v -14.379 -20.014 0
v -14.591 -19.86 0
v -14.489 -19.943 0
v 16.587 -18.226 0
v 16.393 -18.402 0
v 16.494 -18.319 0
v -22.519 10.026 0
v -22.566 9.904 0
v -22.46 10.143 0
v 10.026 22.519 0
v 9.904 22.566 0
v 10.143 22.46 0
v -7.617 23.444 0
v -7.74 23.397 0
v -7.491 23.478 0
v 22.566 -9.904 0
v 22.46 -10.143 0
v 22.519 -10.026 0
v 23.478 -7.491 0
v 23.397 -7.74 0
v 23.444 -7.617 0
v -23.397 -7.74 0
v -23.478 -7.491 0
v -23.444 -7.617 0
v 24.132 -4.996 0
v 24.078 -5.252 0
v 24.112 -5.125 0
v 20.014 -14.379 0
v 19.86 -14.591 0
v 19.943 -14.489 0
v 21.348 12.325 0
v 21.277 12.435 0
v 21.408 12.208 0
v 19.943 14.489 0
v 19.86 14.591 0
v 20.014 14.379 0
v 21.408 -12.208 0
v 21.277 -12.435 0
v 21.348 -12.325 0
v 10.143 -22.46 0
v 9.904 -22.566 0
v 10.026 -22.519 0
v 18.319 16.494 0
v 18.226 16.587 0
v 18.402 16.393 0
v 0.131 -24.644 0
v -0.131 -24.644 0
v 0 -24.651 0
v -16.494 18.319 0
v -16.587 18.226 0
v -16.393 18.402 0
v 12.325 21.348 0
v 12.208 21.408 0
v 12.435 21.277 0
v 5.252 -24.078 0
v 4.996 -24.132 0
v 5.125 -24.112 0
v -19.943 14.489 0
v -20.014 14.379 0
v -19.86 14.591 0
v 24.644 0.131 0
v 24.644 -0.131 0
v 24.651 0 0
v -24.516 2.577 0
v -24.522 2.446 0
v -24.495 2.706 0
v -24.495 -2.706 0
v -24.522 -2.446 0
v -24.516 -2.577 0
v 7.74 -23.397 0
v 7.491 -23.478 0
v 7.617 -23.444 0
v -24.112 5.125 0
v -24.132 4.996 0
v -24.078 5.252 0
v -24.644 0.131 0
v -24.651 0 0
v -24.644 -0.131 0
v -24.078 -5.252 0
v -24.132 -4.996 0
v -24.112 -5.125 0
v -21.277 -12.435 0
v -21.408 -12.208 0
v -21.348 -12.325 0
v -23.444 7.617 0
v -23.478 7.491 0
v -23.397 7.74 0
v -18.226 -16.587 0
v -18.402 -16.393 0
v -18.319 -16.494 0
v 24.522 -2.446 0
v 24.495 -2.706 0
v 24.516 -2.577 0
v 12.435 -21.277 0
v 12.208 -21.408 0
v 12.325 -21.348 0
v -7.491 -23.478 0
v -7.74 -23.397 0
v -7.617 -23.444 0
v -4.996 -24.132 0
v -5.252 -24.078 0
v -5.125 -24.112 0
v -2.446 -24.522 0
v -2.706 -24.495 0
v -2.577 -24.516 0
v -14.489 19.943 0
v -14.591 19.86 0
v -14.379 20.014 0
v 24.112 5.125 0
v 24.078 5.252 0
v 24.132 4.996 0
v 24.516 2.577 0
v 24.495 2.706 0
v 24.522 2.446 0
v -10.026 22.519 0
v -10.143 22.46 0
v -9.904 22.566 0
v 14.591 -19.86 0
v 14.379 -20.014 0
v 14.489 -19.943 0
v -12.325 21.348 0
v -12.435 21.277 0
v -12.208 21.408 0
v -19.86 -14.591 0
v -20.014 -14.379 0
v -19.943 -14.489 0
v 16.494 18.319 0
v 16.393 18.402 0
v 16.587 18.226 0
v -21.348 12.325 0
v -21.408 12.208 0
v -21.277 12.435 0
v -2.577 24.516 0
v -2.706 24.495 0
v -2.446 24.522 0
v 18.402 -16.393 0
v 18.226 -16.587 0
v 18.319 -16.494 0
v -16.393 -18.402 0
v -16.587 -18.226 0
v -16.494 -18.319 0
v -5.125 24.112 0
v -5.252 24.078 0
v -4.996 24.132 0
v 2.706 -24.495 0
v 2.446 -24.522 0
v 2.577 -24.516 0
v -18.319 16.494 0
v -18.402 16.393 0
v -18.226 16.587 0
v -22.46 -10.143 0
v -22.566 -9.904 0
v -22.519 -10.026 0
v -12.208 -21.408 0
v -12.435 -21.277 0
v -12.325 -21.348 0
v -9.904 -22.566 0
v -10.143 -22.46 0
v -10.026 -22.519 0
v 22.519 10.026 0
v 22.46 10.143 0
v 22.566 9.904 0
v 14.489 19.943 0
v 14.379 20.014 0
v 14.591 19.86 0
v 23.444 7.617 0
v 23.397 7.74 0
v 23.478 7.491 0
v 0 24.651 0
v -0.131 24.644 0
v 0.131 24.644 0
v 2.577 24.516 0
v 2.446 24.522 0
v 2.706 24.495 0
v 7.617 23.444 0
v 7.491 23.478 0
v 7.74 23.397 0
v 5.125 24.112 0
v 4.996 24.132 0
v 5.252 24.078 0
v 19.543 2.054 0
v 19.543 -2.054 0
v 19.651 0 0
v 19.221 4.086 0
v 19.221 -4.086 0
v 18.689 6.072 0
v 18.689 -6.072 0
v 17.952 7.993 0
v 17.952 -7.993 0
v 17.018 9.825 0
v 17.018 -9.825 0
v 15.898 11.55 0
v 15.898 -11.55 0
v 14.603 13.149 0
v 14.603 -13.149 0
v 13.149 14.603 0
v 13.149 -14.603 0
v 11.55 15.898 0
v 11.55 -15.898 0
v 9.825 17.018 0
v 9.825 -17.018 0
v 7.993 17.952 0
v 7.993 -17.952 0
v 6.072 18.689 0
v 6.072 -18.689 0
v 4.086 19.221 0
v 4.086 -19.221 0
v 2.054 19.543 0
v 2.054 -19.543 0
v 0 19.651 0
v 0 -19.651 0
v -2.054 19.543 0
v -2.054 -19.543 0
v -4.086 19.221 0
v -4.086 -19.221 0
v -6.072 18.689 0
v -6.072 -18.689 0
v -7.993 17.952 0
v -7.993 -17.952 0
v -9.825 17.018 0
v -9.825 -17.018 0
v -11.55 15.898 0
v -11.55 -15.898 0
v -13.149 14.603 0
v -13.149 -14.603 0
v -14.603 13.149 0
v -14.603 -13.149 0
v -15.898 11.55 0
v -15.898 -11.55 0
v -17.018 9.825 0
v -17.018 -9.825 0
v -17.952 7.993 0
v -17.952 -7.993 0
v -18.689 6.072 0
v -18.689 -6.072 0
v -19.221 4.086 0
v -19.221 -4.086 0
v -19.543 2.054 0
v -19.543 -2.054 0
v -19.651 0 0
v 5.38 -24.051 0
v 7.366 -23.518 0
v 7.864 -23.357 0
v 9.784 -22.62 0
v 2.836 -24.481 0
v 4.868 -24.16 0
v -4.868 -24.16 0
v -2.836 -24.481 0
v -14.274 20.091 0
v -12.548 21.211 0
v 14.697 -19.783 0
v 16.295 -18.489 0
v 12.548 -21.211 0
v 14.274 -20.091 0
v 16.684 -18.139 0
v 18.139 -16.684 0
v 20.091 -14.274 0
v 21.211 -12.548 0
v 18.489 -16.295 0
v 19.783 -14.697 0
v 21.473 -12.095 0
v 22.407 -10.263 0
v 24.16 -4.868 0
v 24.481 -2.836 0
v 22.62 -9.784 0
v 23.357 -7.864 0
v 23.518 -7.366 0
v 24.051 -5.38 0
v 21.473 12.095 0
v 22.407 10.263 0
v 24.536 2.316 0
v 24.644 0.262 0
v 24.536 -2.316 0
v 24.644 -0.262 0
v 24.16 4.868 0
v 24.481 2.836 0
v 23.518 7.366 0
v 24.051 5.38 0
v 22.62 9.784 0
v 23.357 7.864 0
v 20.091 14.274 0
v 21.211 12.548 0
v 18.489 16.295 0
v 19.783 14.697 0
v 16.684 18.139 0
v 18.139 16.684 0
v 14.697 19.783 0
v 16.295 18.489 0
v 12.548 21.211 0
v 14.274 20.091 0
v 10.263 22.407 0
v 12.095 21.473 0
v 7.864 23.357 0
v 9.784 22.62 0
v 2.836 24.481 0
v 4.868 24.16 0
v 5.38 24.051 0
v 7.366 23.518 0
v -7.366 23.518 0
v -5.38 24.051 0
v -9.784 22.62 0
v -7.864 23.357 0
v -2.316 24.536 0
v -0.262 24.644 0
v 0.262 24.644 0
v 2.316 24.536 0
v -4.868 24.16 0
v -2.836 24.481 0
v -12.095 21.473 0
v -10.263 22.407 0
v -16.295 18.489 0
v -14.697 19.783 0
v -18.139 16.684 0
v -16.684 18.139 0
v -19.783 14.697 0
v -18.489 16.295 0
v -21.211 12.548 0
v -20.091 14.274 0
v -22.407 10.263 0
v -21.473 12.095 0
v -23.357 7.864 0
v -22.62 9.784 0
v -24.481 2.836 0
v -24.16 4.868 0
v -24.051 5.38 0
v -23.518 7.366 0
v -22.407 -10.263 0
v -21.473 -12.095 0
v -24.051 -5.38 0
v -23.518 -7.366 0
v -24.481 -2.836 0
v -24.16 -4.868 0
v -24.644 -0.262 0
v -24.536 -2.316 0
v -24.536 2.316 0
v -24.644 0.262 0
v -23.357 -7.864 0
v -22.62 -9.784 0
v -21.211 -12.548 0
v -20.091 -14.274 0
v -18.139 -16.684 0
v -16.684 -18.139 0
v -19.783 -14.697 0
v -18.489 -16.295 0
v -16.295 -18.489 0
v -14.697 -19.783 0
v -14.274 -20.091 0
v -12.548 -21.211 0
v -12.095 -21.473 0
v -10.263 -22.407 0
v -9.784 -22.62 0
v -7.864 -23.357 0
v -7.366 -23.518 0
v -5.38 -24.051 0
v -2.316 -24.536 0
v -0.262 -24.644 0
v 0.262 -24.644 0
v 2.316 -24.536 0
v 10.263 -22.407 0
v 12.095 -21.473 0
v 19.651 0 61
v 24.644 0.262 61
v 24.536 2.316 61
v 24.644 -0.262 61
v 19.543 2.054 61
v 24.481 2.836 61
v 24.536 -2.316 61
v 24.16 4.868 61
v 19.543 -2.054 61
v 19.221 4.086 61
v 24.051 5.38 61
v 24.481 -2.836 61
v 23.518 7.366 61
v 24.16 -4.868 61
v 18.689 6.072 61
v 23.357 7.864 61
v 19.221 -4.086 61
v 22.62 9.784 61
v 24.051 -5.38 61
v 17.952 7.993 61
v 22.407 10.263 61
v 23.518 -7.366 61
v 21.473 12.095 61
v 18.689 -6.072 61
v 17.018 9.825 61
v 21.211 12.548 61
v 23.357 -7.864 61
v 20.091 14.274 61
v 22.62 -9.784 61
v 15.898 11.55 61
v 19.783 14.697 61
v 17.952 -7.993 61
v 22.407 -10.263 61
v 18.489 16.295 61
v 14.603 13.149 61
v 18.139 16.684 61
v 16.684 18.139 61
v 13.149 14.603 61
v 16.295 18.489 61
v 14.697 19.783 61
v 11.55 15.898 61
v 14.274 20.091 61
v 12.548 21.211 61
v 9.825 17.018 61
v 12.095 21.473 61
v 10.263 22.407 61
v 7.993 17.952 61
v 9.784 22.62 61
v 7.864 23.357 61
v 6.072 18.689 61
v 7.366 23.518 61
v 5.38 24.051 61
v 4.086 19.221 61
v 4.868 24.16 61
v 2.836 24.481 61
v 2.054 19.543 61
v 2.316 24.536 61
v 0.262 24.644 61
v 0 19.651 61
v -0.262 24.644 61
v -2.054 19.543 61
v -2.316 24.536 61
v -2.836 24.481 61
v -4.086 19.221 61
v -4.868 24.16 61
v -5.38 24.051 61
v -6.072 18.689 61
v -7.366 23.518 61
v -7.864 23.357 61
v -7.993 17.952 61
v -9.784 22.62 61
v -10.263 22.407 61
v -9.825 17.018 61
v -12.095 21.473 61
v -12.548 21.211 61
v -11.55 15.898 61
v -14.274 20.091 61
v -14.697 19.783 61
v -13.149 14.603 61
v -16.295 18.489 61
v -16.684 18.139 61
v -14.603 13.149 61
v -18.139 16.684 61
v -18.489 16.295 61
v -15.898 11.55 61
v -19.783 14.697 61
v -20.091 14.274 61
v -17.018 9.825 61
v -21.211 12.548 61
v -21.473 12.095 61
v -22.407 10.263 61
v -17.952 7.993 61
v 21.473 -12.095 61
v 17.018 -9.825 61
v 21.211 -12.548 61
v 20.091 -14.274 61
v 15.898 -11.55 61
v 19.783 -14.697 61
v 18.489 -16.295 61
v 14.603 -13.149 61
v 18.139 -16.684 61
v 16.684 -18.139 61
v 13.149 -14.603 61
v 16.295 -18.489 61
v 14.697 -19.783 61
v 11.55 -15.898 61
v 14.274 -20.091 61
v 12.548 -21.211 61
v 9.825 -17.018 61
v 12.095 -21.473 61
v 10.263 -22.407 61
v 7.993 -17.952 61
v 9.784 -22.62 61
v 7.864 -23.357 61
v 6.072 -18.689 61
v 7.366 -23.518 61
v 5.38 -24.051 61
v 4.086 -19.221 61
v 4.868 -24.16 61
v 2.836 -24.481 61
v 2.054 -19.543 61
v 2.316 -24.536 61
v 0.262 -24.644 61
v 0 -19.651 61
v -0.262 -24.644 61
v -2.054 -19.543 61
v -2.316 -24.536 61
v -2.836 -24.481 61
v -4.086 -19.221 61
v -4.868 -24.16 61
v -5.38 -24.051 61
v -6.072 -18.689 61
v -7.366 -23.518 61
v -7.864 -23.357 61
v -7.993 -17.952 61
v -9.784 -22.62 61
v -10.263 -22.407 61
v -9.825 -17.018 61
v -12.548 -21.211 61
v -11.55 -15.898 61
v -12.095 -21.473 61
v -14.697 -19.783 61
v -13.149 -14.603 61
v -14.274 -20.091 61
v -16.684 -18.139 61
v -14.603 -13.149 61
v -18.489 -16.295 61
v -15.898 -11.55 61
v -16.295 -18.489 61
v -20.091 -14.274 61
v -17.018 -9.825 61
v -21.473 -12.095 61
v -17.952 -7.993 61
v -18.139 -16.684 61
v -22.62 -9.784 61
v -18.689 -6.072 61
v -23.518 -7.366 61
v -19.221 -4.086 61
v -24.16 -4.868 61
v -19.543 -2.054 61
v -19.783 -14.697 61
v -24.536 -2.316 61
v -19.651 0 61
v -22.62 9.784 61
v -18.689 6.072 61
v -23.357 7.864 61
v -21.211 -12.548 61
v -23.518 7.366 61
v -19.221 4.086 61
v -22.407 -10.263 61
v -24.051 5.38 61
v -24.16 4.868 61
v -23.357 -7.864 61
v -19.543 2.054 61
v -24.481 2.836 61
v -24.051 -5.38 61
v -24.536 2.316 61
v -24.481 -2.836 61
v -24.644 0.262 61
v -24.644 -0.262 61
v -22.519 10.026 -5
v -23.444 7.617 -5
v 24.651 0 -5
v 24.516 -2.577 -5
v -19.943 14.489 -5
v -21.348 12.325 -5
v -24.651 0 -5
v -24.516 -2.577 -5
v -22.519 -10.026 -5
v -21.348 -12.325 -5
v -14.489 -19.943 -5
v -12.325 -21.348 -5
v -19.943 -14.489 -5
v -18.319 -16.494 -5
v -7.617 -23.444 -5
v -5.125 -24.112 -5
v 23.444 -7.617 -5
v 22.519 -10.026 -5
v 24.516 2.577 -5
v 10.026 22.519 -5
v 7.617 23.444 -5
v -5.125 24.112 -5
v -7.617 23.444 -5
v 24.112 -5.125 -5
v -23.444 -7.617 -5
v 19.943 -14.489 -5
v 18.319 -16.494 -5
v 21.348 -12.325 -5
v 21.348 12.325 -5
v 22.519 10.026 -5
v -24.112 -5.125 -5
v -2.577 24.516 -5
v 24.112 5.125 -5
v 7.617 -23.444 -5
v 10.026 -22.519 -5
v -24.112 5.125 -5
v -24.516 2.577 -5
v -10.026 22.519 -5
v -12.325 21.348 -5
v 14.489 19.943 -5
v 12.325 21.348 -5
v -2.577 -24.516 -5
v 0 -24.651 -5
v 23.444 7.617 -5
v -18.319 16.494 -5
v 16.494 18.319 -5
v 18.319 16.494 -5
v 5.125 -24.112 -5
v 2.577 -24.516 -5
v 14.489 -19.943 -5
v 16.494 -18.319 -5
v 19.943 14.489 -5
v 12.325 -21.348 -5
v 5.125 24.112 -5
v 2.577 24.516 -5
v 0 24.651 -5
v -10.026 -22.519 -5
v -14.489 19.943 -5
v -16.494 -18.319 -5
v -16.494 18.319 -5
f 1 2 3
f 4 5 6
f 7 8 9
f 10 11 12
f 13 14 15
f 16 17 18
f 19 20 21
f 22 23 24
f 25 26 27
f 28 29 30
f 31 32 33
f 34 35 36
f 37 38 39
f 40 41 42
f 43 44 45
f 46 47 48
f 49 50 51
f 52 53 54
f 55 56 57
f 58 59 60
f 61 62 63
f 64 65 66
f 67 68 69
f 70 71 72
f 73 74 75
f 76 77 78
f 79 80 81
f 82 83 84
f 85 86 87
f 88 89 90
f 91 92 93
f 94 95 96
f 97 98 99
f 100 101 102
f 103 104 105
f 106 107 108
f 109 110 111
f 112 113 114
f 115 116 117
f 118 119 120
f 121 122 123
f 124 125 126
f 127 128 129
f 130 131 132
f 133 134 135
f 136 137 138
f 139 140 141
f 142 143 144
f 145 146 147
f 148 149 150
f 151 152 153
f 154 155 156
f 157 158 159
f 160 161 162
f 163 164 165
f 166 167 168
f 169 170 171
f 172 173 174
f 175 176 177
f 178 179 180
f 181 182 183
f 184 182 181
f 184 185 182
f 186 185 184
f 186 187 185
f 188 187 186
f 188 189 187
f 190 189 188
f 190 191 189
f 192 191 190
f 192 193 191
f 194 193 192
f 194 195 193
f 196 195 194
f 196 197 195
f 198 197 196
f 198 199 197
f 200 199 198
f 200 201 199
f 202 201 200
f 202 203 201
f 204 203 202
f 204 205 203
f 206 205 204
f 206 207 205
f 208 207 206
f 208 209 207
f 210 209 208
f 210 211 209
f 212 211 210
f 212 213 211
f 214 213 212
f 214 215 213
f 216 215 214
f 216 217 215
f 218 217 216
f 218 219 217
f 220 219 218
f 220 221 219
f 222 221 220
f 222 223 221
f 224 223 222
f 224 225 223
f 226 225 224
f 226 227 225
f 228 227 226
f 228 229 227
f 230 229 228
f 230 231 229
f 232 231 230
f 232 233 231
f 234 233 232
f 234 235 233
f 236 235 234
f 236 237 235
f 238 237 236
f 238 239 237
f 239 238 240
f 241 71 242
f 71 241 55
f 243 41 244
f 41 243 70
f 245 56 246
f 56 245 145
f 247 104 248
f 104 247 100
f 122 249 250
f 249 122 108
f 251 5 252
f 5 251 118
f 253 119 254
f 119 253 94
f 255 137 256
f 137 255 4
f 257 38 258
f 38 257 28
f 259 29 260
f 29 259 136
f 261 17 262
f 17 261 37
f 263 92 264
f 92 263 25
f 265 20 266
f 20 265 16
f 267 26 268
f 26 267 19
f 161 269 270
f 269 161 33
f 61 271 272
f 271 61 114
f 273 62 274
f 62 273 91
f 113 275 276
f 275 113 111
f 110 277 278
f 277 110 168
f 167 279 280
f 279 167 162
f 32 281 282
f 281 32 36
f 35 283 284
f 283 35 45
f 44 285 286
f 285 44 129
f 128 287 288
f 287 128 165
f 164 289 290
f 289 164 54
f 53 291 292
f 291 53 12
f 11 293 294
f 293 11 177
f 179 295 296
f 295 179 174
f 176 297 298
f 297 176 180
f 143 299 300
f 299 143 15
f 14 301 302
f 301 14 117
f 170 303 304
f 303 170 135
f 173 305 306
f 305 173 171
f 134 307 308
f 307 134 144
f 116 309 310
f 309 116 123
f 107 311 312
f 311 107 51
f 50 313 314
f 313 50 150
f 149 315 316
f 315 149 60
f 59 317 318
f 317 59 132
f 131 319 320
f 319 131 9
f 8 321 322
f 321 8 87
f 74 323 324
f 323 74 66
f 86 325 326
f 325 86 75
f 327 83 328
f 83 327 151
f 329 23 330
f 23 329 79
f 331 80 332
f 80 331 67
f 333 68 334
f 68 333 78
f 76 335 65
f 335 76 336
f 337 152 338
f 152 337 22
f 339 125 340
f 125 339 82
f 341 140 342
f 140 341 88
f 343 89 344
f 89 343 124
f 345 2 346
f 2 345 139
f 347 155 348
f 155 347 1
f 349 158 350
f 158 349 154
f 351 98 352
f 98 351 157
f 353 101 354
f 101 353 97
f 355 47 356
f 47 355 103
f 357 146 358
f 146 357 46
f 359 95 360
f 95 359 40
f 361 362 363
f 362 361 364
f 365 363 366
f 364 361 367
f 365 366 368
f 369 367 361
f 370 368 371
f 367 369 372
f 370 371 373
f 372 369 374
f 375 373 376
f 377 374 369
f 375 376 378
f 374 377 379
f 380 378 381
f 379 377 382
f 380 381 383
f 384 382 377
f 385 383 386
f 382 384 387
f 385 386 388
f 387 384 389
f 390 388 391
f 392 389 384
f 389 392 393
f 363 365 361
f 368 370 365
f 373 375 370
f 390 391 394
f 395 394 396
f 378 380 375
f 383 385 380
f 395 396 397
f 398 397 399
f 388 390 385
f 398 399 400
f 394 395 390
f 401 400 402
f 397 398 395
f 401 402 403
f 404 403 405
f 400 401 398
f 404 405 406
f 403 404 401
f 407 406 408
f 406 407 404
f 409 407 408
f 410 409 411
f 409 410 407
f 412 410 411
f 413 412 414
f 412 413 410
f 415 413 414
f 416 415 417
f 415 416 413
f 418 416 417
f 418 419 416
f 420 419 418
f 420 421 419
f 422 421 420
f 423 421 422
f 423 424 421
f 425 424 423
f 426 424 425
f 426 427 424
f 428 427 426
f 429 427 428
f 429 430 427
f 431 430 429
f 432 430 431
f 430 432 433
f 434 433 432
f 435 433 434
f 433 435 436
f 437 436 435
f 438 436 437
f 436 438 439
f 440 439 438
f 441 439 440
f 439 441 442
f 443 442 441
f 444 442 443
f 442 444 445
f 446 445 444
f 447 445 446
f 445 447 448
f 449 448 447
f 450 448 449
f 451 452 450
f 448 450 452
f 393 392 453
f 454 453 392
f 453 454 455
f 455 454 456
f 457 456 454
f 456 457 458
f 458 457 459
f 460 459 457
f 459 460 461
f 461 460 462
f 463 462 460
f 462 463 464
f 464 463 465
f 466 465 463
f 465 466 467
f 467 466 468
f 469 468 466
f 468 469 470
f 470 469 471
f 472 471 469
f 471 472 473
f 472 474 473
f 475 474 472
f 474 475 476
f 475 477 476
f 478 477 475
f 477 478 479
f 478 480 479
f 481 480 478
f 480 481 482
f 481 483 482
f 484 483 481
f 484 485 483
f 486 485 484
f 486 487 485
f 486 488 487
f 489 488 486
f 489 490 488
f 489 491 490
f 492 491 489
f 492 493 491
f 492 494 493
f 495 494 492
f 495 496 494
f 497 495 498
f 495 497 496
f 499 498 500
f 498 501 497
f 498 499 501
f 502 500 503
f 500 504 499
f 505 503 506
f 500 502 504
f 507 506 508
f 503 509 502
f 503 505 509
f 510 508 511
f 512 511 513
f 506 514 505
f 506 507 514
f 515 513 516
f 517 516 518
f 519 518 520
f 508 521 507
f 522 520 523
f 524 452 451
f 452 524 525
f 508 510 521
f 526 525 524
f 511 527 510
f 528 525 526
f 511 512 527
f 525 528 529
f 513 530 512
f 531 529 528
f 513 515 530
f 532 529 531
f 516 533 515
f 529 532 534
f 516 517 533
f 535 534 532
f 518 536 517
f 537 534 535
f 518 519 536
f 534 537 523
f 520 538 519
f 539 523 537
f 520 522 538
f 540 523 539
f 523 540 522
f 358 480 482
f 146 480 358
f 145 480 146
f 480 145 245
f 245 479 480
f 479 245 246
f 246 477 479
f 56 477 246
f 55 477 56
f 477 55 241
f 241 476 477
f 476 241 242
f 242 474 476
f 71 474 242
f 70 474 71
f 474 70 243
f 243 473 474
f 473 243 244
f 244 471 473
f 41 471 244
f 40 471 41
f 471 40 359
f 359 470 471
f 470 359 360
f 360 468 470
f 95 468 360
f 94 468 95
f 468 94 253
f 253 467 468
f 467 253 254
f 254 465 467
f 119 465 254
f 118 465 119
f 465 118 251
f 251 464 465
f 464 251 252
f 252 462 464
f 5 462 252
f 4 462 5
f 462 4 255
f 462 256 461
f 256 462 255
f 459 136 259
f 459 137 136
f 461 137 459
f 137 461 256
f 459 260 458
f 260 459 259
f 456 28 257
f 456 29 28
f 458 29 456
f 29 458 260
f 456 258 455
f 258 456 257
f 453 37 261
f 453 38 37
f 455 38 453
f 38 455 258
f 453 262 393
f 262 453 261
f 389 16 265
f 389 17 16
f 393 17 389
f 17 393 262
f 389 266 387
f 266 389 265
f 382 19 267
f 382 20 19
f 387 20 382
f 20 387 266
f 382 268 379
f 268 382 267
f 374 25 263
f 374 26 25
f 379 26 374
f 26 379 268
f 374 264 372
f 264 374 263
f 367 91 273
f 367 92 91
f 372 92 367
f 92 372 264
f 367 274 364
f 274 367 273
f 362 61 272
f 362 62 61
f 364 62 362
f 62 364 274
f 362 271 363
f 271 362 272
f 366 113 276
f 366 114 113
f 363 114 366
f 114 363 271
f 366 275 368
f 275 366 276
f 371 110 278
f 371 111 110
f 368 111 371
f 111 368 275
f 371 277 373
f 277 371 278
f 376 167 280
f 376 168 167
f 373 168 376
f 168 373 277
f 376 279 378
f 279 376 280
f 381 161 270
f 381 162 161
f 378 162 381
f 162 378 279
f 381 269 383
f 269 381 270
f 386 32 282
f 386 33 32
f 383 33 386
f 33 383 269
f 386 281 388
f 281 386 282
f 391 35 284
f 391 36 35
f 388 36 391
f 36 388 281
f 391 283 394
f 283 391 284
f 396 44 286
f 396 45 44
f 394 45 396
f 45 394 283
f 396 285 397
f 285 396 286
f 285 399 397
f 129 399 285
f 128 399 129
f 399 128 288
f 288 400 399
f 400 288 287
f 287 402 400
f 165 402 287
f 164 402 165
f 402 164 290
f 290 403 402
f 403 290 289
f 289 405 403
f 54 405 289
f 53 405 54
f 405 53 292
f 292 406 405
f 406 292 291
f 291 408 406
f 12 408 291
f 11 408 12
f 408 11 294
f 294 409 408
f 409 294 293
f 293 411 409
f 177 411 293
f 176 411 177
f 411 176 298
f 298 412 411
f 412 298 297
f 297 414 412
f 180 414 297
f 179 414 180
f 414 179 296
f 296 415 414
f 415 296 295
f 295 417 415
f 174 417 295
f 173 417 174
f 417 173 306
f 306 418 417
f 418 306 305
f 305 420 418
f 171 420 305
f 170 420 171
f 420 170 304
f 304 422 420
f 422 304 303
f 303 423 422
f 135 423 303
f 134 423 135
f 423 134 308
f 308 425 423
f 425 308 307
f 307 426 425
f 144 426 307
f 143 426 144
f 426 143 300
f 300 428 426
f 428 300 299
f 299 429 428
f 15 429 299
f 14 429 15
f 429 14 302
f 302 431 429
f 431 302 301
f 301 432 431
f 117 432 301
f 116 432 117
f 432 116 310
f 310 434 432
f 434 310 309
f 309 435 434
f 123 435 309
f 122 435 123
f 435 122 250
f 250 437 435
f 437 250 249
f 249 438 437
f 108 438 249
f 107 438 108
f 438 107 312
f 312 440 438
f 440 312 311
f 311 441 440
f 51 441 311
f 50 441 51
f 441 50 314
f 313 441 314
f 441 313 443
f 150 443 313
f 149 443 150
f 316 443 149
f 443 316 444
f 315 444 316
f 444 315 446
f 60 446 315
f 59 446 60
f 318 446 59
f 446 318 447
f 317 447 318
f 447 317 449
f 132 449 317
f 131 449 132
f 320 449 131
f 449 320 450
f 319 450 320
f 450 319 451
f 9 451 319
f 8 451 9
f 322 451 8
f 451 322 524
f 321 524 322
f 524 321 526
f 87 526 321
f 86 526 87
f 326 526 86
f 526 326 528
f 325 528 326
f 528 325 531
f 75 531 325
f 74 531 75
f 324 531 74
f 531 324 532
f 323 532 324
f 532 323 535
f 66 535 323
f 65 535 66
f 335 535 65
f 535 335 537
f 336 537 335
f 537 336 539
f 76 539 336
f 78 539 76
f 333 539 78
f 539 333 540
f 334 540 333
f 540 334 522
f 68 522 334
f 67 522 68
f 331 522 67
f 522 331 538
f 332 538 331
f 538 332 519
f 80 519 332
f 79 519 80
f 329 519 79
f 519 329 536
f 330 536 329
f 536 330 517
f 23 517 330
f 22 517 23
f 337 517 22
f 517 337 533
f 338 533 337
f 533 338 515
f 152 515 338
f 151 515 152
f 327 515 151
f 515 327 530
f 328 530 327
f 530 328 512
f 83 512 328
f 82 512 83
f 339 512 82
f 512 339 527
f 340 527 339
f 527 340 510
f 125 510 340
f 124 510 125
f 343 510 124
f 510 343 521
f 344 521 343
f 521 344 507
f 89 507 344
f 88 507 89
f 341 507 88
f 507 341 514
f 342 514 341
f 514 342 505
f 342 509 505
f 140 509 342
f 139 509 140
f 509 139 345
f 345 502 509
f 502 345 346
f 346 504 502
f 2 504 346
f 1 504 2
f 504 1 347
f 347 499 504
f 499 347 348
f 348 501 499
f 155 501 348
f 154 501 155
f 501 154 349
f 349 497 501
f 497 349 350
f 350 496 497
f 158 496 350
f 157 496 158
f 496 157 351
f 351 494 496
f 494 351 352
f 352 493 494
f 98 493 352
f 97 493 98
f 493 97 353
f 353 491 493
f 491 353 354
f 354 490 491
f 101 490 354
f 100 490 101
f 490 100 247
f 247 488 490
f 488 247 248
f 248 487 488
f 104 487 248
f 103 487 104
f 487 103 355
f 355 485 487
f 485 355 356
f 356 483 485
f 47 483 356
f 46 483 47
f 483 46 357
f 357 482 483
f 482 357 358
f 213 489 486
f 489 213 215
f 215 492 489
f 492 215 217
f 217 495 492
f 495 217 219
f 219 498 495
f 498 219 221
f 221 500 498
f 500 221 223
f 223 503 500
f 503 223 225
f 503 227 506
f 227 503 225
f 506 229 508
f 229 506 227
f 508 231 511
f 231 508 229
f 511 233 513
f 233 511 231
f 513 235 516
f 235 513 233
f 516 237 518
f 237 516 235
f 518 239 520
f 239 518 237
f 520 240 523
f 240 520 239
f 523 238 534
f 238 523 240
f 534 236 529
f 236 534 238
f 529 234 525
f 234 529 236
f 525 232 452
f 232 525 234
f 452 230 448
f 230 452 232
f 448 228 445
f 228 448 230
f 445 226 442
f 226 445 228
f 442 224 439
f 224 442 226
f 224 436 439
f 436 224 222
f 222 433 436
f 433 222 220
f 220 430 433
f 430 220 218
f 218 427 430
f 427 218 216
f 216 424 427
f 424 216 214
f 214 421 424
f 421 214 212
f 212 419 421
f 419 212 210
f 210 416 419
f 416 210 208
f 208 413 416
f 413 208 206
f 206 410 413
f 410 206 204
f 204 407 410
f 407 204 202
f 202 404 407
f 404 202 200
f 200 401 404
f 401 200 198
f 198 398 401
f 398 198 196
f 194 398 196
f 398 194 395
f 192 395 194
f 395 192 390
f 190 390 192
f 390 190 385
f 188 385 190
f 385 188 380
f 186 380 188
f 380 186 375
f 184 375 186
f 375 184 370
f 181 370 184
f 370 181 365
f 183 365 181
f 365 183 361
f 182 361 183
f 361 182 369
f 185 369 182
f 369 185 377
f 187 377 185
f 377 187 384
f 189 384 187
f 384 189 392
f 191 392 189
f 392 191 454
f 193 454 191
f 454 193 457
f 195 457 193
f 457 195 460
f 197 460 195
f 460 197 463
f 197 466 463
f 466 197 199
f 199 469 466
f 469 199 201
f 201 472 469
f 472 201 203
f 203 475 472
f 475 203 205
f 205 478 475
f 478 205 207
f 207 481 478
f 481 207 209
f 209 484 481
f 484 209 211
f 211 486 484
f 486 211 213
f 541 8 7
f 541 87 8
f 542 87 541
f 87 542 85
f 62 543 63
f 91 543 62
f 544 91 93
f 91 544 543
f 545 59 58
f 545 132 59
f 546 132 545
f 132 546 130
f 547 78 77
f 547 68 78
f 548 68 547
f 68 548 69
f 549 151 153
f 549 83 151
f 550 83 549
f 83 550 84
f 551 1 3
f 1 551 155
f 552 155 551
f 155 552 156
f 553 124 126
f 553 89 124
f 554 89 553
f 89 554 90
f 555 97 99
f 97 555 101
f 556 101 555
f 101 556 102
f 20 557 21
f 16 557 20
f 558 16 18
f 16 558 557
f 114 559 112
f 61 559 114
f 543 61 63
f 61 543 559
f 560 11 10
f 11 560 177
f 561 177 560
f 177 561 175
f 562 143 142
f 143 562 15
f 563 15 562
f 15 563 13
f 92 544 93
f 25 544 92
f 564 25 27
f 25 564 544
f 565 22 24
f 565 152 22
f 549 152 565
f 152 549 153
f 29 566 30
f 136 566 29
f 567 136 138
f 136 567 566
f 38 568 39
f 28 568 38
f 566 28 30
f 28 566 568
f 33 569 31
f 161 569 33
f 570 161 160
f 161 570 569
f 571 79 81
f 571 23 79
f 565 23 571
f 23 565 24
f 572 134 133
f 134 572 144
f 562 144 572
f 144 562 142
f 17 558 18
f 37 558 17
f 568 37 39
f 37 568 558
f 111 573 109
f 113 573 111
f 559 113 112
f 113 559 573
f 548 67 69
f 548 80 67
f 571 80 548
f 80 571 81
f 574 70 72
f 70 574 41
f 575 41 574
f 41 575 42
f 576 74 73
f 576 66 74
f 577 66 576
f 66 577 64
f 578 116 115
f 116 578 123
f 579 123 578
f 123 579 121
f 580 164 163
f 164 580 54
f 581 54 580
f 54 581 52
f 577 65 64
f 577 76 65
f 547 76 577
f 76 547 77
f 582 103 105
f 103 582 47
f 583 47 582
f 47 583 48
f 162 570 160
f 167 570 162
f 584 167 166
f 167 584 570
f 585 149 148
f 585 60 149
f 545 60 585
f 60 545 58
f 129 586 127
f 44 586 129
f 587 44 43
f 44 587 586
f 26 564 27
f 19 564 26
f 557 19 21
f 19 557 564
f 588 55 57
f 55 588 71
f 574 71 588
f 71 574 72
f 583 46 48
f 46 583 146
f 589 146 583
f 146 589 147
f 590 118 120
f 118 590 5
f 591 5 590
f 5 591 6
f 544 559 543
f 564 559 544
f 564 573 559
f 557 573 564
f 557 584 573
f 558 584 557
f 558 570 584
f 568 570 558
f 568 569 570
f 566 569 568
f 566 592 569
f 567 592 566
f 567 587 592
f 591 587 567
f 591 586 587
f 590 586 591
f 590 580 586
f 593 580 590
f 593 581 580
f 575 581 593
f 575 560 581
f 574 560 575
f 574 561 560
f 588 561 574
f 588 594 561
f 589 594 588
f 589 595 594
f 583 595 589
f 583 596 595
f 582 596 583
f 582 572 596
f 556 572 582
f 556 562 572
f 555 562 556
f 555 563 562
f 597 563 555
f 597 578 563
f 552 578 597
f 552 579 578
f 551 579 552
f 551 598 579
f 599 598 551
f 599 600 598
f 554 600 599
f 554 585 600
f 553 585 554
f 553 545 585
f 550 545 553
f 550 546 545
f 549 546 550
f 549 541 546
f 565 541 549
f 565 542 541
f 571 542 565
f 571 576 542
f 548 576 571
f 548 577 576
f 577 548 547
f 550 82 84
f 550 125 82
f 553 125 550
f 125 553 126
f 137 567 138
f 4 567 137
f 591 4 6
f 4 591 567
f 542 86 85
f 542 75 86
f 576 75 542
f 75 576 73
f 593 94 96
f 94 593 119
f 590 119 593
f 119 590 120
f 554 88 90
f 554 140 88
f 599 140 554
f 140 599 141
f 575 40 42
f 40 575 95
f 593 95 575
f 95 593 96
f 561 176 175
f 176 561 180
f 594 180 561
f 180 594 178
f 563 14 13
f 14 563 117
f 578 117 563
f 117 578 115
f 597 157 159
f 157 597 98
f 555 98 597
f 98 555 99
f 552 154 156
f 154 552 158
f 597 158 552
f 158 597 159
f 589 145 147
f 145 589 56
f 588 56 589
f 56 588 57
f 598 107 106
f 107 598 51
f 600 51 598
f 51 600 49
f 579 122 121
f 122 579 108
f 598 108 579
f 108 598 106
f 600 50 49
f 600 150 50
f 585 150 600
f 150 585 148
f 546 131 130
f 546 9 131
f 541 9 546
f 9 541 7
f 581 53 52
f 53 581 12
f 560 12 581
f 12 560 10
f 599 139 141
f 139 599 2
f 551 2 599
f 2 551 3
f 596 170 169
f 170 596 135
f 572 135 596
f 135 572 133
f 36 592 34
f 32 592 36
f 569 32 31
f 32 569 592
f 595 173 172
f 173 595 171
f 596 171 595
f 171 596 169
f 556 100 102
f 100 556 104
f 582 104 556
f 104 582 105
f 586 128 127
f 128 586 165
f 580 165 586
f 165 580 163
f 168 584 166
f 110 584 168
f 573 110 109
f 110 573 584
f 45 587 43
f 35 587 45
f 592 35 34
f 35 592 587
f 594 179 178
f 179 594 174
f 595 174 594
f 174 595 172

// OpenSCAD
$fn = 60;

VOLUME = 74 * 1000;
HEIGHT = 61;
RADIUS = sqrt(VOLUME / (PI * HEIGHT));

THICKNESS = 5;

echo(RADIUS);

union()
{
    linear_extrude(height = HEIGHT)
    {
        difference()
        {
            offset(THICKNESS)
            {
                circle(r = RADIUS);
            }
            circle(r = RADIUS);
        }
    }
    translate(v = [ 0, 0, -5 ])
    {
        linear_extrude(height = THICKNESS)
        {
            circle(r = RADIUS + THICKNESS);
        };
    };
}
